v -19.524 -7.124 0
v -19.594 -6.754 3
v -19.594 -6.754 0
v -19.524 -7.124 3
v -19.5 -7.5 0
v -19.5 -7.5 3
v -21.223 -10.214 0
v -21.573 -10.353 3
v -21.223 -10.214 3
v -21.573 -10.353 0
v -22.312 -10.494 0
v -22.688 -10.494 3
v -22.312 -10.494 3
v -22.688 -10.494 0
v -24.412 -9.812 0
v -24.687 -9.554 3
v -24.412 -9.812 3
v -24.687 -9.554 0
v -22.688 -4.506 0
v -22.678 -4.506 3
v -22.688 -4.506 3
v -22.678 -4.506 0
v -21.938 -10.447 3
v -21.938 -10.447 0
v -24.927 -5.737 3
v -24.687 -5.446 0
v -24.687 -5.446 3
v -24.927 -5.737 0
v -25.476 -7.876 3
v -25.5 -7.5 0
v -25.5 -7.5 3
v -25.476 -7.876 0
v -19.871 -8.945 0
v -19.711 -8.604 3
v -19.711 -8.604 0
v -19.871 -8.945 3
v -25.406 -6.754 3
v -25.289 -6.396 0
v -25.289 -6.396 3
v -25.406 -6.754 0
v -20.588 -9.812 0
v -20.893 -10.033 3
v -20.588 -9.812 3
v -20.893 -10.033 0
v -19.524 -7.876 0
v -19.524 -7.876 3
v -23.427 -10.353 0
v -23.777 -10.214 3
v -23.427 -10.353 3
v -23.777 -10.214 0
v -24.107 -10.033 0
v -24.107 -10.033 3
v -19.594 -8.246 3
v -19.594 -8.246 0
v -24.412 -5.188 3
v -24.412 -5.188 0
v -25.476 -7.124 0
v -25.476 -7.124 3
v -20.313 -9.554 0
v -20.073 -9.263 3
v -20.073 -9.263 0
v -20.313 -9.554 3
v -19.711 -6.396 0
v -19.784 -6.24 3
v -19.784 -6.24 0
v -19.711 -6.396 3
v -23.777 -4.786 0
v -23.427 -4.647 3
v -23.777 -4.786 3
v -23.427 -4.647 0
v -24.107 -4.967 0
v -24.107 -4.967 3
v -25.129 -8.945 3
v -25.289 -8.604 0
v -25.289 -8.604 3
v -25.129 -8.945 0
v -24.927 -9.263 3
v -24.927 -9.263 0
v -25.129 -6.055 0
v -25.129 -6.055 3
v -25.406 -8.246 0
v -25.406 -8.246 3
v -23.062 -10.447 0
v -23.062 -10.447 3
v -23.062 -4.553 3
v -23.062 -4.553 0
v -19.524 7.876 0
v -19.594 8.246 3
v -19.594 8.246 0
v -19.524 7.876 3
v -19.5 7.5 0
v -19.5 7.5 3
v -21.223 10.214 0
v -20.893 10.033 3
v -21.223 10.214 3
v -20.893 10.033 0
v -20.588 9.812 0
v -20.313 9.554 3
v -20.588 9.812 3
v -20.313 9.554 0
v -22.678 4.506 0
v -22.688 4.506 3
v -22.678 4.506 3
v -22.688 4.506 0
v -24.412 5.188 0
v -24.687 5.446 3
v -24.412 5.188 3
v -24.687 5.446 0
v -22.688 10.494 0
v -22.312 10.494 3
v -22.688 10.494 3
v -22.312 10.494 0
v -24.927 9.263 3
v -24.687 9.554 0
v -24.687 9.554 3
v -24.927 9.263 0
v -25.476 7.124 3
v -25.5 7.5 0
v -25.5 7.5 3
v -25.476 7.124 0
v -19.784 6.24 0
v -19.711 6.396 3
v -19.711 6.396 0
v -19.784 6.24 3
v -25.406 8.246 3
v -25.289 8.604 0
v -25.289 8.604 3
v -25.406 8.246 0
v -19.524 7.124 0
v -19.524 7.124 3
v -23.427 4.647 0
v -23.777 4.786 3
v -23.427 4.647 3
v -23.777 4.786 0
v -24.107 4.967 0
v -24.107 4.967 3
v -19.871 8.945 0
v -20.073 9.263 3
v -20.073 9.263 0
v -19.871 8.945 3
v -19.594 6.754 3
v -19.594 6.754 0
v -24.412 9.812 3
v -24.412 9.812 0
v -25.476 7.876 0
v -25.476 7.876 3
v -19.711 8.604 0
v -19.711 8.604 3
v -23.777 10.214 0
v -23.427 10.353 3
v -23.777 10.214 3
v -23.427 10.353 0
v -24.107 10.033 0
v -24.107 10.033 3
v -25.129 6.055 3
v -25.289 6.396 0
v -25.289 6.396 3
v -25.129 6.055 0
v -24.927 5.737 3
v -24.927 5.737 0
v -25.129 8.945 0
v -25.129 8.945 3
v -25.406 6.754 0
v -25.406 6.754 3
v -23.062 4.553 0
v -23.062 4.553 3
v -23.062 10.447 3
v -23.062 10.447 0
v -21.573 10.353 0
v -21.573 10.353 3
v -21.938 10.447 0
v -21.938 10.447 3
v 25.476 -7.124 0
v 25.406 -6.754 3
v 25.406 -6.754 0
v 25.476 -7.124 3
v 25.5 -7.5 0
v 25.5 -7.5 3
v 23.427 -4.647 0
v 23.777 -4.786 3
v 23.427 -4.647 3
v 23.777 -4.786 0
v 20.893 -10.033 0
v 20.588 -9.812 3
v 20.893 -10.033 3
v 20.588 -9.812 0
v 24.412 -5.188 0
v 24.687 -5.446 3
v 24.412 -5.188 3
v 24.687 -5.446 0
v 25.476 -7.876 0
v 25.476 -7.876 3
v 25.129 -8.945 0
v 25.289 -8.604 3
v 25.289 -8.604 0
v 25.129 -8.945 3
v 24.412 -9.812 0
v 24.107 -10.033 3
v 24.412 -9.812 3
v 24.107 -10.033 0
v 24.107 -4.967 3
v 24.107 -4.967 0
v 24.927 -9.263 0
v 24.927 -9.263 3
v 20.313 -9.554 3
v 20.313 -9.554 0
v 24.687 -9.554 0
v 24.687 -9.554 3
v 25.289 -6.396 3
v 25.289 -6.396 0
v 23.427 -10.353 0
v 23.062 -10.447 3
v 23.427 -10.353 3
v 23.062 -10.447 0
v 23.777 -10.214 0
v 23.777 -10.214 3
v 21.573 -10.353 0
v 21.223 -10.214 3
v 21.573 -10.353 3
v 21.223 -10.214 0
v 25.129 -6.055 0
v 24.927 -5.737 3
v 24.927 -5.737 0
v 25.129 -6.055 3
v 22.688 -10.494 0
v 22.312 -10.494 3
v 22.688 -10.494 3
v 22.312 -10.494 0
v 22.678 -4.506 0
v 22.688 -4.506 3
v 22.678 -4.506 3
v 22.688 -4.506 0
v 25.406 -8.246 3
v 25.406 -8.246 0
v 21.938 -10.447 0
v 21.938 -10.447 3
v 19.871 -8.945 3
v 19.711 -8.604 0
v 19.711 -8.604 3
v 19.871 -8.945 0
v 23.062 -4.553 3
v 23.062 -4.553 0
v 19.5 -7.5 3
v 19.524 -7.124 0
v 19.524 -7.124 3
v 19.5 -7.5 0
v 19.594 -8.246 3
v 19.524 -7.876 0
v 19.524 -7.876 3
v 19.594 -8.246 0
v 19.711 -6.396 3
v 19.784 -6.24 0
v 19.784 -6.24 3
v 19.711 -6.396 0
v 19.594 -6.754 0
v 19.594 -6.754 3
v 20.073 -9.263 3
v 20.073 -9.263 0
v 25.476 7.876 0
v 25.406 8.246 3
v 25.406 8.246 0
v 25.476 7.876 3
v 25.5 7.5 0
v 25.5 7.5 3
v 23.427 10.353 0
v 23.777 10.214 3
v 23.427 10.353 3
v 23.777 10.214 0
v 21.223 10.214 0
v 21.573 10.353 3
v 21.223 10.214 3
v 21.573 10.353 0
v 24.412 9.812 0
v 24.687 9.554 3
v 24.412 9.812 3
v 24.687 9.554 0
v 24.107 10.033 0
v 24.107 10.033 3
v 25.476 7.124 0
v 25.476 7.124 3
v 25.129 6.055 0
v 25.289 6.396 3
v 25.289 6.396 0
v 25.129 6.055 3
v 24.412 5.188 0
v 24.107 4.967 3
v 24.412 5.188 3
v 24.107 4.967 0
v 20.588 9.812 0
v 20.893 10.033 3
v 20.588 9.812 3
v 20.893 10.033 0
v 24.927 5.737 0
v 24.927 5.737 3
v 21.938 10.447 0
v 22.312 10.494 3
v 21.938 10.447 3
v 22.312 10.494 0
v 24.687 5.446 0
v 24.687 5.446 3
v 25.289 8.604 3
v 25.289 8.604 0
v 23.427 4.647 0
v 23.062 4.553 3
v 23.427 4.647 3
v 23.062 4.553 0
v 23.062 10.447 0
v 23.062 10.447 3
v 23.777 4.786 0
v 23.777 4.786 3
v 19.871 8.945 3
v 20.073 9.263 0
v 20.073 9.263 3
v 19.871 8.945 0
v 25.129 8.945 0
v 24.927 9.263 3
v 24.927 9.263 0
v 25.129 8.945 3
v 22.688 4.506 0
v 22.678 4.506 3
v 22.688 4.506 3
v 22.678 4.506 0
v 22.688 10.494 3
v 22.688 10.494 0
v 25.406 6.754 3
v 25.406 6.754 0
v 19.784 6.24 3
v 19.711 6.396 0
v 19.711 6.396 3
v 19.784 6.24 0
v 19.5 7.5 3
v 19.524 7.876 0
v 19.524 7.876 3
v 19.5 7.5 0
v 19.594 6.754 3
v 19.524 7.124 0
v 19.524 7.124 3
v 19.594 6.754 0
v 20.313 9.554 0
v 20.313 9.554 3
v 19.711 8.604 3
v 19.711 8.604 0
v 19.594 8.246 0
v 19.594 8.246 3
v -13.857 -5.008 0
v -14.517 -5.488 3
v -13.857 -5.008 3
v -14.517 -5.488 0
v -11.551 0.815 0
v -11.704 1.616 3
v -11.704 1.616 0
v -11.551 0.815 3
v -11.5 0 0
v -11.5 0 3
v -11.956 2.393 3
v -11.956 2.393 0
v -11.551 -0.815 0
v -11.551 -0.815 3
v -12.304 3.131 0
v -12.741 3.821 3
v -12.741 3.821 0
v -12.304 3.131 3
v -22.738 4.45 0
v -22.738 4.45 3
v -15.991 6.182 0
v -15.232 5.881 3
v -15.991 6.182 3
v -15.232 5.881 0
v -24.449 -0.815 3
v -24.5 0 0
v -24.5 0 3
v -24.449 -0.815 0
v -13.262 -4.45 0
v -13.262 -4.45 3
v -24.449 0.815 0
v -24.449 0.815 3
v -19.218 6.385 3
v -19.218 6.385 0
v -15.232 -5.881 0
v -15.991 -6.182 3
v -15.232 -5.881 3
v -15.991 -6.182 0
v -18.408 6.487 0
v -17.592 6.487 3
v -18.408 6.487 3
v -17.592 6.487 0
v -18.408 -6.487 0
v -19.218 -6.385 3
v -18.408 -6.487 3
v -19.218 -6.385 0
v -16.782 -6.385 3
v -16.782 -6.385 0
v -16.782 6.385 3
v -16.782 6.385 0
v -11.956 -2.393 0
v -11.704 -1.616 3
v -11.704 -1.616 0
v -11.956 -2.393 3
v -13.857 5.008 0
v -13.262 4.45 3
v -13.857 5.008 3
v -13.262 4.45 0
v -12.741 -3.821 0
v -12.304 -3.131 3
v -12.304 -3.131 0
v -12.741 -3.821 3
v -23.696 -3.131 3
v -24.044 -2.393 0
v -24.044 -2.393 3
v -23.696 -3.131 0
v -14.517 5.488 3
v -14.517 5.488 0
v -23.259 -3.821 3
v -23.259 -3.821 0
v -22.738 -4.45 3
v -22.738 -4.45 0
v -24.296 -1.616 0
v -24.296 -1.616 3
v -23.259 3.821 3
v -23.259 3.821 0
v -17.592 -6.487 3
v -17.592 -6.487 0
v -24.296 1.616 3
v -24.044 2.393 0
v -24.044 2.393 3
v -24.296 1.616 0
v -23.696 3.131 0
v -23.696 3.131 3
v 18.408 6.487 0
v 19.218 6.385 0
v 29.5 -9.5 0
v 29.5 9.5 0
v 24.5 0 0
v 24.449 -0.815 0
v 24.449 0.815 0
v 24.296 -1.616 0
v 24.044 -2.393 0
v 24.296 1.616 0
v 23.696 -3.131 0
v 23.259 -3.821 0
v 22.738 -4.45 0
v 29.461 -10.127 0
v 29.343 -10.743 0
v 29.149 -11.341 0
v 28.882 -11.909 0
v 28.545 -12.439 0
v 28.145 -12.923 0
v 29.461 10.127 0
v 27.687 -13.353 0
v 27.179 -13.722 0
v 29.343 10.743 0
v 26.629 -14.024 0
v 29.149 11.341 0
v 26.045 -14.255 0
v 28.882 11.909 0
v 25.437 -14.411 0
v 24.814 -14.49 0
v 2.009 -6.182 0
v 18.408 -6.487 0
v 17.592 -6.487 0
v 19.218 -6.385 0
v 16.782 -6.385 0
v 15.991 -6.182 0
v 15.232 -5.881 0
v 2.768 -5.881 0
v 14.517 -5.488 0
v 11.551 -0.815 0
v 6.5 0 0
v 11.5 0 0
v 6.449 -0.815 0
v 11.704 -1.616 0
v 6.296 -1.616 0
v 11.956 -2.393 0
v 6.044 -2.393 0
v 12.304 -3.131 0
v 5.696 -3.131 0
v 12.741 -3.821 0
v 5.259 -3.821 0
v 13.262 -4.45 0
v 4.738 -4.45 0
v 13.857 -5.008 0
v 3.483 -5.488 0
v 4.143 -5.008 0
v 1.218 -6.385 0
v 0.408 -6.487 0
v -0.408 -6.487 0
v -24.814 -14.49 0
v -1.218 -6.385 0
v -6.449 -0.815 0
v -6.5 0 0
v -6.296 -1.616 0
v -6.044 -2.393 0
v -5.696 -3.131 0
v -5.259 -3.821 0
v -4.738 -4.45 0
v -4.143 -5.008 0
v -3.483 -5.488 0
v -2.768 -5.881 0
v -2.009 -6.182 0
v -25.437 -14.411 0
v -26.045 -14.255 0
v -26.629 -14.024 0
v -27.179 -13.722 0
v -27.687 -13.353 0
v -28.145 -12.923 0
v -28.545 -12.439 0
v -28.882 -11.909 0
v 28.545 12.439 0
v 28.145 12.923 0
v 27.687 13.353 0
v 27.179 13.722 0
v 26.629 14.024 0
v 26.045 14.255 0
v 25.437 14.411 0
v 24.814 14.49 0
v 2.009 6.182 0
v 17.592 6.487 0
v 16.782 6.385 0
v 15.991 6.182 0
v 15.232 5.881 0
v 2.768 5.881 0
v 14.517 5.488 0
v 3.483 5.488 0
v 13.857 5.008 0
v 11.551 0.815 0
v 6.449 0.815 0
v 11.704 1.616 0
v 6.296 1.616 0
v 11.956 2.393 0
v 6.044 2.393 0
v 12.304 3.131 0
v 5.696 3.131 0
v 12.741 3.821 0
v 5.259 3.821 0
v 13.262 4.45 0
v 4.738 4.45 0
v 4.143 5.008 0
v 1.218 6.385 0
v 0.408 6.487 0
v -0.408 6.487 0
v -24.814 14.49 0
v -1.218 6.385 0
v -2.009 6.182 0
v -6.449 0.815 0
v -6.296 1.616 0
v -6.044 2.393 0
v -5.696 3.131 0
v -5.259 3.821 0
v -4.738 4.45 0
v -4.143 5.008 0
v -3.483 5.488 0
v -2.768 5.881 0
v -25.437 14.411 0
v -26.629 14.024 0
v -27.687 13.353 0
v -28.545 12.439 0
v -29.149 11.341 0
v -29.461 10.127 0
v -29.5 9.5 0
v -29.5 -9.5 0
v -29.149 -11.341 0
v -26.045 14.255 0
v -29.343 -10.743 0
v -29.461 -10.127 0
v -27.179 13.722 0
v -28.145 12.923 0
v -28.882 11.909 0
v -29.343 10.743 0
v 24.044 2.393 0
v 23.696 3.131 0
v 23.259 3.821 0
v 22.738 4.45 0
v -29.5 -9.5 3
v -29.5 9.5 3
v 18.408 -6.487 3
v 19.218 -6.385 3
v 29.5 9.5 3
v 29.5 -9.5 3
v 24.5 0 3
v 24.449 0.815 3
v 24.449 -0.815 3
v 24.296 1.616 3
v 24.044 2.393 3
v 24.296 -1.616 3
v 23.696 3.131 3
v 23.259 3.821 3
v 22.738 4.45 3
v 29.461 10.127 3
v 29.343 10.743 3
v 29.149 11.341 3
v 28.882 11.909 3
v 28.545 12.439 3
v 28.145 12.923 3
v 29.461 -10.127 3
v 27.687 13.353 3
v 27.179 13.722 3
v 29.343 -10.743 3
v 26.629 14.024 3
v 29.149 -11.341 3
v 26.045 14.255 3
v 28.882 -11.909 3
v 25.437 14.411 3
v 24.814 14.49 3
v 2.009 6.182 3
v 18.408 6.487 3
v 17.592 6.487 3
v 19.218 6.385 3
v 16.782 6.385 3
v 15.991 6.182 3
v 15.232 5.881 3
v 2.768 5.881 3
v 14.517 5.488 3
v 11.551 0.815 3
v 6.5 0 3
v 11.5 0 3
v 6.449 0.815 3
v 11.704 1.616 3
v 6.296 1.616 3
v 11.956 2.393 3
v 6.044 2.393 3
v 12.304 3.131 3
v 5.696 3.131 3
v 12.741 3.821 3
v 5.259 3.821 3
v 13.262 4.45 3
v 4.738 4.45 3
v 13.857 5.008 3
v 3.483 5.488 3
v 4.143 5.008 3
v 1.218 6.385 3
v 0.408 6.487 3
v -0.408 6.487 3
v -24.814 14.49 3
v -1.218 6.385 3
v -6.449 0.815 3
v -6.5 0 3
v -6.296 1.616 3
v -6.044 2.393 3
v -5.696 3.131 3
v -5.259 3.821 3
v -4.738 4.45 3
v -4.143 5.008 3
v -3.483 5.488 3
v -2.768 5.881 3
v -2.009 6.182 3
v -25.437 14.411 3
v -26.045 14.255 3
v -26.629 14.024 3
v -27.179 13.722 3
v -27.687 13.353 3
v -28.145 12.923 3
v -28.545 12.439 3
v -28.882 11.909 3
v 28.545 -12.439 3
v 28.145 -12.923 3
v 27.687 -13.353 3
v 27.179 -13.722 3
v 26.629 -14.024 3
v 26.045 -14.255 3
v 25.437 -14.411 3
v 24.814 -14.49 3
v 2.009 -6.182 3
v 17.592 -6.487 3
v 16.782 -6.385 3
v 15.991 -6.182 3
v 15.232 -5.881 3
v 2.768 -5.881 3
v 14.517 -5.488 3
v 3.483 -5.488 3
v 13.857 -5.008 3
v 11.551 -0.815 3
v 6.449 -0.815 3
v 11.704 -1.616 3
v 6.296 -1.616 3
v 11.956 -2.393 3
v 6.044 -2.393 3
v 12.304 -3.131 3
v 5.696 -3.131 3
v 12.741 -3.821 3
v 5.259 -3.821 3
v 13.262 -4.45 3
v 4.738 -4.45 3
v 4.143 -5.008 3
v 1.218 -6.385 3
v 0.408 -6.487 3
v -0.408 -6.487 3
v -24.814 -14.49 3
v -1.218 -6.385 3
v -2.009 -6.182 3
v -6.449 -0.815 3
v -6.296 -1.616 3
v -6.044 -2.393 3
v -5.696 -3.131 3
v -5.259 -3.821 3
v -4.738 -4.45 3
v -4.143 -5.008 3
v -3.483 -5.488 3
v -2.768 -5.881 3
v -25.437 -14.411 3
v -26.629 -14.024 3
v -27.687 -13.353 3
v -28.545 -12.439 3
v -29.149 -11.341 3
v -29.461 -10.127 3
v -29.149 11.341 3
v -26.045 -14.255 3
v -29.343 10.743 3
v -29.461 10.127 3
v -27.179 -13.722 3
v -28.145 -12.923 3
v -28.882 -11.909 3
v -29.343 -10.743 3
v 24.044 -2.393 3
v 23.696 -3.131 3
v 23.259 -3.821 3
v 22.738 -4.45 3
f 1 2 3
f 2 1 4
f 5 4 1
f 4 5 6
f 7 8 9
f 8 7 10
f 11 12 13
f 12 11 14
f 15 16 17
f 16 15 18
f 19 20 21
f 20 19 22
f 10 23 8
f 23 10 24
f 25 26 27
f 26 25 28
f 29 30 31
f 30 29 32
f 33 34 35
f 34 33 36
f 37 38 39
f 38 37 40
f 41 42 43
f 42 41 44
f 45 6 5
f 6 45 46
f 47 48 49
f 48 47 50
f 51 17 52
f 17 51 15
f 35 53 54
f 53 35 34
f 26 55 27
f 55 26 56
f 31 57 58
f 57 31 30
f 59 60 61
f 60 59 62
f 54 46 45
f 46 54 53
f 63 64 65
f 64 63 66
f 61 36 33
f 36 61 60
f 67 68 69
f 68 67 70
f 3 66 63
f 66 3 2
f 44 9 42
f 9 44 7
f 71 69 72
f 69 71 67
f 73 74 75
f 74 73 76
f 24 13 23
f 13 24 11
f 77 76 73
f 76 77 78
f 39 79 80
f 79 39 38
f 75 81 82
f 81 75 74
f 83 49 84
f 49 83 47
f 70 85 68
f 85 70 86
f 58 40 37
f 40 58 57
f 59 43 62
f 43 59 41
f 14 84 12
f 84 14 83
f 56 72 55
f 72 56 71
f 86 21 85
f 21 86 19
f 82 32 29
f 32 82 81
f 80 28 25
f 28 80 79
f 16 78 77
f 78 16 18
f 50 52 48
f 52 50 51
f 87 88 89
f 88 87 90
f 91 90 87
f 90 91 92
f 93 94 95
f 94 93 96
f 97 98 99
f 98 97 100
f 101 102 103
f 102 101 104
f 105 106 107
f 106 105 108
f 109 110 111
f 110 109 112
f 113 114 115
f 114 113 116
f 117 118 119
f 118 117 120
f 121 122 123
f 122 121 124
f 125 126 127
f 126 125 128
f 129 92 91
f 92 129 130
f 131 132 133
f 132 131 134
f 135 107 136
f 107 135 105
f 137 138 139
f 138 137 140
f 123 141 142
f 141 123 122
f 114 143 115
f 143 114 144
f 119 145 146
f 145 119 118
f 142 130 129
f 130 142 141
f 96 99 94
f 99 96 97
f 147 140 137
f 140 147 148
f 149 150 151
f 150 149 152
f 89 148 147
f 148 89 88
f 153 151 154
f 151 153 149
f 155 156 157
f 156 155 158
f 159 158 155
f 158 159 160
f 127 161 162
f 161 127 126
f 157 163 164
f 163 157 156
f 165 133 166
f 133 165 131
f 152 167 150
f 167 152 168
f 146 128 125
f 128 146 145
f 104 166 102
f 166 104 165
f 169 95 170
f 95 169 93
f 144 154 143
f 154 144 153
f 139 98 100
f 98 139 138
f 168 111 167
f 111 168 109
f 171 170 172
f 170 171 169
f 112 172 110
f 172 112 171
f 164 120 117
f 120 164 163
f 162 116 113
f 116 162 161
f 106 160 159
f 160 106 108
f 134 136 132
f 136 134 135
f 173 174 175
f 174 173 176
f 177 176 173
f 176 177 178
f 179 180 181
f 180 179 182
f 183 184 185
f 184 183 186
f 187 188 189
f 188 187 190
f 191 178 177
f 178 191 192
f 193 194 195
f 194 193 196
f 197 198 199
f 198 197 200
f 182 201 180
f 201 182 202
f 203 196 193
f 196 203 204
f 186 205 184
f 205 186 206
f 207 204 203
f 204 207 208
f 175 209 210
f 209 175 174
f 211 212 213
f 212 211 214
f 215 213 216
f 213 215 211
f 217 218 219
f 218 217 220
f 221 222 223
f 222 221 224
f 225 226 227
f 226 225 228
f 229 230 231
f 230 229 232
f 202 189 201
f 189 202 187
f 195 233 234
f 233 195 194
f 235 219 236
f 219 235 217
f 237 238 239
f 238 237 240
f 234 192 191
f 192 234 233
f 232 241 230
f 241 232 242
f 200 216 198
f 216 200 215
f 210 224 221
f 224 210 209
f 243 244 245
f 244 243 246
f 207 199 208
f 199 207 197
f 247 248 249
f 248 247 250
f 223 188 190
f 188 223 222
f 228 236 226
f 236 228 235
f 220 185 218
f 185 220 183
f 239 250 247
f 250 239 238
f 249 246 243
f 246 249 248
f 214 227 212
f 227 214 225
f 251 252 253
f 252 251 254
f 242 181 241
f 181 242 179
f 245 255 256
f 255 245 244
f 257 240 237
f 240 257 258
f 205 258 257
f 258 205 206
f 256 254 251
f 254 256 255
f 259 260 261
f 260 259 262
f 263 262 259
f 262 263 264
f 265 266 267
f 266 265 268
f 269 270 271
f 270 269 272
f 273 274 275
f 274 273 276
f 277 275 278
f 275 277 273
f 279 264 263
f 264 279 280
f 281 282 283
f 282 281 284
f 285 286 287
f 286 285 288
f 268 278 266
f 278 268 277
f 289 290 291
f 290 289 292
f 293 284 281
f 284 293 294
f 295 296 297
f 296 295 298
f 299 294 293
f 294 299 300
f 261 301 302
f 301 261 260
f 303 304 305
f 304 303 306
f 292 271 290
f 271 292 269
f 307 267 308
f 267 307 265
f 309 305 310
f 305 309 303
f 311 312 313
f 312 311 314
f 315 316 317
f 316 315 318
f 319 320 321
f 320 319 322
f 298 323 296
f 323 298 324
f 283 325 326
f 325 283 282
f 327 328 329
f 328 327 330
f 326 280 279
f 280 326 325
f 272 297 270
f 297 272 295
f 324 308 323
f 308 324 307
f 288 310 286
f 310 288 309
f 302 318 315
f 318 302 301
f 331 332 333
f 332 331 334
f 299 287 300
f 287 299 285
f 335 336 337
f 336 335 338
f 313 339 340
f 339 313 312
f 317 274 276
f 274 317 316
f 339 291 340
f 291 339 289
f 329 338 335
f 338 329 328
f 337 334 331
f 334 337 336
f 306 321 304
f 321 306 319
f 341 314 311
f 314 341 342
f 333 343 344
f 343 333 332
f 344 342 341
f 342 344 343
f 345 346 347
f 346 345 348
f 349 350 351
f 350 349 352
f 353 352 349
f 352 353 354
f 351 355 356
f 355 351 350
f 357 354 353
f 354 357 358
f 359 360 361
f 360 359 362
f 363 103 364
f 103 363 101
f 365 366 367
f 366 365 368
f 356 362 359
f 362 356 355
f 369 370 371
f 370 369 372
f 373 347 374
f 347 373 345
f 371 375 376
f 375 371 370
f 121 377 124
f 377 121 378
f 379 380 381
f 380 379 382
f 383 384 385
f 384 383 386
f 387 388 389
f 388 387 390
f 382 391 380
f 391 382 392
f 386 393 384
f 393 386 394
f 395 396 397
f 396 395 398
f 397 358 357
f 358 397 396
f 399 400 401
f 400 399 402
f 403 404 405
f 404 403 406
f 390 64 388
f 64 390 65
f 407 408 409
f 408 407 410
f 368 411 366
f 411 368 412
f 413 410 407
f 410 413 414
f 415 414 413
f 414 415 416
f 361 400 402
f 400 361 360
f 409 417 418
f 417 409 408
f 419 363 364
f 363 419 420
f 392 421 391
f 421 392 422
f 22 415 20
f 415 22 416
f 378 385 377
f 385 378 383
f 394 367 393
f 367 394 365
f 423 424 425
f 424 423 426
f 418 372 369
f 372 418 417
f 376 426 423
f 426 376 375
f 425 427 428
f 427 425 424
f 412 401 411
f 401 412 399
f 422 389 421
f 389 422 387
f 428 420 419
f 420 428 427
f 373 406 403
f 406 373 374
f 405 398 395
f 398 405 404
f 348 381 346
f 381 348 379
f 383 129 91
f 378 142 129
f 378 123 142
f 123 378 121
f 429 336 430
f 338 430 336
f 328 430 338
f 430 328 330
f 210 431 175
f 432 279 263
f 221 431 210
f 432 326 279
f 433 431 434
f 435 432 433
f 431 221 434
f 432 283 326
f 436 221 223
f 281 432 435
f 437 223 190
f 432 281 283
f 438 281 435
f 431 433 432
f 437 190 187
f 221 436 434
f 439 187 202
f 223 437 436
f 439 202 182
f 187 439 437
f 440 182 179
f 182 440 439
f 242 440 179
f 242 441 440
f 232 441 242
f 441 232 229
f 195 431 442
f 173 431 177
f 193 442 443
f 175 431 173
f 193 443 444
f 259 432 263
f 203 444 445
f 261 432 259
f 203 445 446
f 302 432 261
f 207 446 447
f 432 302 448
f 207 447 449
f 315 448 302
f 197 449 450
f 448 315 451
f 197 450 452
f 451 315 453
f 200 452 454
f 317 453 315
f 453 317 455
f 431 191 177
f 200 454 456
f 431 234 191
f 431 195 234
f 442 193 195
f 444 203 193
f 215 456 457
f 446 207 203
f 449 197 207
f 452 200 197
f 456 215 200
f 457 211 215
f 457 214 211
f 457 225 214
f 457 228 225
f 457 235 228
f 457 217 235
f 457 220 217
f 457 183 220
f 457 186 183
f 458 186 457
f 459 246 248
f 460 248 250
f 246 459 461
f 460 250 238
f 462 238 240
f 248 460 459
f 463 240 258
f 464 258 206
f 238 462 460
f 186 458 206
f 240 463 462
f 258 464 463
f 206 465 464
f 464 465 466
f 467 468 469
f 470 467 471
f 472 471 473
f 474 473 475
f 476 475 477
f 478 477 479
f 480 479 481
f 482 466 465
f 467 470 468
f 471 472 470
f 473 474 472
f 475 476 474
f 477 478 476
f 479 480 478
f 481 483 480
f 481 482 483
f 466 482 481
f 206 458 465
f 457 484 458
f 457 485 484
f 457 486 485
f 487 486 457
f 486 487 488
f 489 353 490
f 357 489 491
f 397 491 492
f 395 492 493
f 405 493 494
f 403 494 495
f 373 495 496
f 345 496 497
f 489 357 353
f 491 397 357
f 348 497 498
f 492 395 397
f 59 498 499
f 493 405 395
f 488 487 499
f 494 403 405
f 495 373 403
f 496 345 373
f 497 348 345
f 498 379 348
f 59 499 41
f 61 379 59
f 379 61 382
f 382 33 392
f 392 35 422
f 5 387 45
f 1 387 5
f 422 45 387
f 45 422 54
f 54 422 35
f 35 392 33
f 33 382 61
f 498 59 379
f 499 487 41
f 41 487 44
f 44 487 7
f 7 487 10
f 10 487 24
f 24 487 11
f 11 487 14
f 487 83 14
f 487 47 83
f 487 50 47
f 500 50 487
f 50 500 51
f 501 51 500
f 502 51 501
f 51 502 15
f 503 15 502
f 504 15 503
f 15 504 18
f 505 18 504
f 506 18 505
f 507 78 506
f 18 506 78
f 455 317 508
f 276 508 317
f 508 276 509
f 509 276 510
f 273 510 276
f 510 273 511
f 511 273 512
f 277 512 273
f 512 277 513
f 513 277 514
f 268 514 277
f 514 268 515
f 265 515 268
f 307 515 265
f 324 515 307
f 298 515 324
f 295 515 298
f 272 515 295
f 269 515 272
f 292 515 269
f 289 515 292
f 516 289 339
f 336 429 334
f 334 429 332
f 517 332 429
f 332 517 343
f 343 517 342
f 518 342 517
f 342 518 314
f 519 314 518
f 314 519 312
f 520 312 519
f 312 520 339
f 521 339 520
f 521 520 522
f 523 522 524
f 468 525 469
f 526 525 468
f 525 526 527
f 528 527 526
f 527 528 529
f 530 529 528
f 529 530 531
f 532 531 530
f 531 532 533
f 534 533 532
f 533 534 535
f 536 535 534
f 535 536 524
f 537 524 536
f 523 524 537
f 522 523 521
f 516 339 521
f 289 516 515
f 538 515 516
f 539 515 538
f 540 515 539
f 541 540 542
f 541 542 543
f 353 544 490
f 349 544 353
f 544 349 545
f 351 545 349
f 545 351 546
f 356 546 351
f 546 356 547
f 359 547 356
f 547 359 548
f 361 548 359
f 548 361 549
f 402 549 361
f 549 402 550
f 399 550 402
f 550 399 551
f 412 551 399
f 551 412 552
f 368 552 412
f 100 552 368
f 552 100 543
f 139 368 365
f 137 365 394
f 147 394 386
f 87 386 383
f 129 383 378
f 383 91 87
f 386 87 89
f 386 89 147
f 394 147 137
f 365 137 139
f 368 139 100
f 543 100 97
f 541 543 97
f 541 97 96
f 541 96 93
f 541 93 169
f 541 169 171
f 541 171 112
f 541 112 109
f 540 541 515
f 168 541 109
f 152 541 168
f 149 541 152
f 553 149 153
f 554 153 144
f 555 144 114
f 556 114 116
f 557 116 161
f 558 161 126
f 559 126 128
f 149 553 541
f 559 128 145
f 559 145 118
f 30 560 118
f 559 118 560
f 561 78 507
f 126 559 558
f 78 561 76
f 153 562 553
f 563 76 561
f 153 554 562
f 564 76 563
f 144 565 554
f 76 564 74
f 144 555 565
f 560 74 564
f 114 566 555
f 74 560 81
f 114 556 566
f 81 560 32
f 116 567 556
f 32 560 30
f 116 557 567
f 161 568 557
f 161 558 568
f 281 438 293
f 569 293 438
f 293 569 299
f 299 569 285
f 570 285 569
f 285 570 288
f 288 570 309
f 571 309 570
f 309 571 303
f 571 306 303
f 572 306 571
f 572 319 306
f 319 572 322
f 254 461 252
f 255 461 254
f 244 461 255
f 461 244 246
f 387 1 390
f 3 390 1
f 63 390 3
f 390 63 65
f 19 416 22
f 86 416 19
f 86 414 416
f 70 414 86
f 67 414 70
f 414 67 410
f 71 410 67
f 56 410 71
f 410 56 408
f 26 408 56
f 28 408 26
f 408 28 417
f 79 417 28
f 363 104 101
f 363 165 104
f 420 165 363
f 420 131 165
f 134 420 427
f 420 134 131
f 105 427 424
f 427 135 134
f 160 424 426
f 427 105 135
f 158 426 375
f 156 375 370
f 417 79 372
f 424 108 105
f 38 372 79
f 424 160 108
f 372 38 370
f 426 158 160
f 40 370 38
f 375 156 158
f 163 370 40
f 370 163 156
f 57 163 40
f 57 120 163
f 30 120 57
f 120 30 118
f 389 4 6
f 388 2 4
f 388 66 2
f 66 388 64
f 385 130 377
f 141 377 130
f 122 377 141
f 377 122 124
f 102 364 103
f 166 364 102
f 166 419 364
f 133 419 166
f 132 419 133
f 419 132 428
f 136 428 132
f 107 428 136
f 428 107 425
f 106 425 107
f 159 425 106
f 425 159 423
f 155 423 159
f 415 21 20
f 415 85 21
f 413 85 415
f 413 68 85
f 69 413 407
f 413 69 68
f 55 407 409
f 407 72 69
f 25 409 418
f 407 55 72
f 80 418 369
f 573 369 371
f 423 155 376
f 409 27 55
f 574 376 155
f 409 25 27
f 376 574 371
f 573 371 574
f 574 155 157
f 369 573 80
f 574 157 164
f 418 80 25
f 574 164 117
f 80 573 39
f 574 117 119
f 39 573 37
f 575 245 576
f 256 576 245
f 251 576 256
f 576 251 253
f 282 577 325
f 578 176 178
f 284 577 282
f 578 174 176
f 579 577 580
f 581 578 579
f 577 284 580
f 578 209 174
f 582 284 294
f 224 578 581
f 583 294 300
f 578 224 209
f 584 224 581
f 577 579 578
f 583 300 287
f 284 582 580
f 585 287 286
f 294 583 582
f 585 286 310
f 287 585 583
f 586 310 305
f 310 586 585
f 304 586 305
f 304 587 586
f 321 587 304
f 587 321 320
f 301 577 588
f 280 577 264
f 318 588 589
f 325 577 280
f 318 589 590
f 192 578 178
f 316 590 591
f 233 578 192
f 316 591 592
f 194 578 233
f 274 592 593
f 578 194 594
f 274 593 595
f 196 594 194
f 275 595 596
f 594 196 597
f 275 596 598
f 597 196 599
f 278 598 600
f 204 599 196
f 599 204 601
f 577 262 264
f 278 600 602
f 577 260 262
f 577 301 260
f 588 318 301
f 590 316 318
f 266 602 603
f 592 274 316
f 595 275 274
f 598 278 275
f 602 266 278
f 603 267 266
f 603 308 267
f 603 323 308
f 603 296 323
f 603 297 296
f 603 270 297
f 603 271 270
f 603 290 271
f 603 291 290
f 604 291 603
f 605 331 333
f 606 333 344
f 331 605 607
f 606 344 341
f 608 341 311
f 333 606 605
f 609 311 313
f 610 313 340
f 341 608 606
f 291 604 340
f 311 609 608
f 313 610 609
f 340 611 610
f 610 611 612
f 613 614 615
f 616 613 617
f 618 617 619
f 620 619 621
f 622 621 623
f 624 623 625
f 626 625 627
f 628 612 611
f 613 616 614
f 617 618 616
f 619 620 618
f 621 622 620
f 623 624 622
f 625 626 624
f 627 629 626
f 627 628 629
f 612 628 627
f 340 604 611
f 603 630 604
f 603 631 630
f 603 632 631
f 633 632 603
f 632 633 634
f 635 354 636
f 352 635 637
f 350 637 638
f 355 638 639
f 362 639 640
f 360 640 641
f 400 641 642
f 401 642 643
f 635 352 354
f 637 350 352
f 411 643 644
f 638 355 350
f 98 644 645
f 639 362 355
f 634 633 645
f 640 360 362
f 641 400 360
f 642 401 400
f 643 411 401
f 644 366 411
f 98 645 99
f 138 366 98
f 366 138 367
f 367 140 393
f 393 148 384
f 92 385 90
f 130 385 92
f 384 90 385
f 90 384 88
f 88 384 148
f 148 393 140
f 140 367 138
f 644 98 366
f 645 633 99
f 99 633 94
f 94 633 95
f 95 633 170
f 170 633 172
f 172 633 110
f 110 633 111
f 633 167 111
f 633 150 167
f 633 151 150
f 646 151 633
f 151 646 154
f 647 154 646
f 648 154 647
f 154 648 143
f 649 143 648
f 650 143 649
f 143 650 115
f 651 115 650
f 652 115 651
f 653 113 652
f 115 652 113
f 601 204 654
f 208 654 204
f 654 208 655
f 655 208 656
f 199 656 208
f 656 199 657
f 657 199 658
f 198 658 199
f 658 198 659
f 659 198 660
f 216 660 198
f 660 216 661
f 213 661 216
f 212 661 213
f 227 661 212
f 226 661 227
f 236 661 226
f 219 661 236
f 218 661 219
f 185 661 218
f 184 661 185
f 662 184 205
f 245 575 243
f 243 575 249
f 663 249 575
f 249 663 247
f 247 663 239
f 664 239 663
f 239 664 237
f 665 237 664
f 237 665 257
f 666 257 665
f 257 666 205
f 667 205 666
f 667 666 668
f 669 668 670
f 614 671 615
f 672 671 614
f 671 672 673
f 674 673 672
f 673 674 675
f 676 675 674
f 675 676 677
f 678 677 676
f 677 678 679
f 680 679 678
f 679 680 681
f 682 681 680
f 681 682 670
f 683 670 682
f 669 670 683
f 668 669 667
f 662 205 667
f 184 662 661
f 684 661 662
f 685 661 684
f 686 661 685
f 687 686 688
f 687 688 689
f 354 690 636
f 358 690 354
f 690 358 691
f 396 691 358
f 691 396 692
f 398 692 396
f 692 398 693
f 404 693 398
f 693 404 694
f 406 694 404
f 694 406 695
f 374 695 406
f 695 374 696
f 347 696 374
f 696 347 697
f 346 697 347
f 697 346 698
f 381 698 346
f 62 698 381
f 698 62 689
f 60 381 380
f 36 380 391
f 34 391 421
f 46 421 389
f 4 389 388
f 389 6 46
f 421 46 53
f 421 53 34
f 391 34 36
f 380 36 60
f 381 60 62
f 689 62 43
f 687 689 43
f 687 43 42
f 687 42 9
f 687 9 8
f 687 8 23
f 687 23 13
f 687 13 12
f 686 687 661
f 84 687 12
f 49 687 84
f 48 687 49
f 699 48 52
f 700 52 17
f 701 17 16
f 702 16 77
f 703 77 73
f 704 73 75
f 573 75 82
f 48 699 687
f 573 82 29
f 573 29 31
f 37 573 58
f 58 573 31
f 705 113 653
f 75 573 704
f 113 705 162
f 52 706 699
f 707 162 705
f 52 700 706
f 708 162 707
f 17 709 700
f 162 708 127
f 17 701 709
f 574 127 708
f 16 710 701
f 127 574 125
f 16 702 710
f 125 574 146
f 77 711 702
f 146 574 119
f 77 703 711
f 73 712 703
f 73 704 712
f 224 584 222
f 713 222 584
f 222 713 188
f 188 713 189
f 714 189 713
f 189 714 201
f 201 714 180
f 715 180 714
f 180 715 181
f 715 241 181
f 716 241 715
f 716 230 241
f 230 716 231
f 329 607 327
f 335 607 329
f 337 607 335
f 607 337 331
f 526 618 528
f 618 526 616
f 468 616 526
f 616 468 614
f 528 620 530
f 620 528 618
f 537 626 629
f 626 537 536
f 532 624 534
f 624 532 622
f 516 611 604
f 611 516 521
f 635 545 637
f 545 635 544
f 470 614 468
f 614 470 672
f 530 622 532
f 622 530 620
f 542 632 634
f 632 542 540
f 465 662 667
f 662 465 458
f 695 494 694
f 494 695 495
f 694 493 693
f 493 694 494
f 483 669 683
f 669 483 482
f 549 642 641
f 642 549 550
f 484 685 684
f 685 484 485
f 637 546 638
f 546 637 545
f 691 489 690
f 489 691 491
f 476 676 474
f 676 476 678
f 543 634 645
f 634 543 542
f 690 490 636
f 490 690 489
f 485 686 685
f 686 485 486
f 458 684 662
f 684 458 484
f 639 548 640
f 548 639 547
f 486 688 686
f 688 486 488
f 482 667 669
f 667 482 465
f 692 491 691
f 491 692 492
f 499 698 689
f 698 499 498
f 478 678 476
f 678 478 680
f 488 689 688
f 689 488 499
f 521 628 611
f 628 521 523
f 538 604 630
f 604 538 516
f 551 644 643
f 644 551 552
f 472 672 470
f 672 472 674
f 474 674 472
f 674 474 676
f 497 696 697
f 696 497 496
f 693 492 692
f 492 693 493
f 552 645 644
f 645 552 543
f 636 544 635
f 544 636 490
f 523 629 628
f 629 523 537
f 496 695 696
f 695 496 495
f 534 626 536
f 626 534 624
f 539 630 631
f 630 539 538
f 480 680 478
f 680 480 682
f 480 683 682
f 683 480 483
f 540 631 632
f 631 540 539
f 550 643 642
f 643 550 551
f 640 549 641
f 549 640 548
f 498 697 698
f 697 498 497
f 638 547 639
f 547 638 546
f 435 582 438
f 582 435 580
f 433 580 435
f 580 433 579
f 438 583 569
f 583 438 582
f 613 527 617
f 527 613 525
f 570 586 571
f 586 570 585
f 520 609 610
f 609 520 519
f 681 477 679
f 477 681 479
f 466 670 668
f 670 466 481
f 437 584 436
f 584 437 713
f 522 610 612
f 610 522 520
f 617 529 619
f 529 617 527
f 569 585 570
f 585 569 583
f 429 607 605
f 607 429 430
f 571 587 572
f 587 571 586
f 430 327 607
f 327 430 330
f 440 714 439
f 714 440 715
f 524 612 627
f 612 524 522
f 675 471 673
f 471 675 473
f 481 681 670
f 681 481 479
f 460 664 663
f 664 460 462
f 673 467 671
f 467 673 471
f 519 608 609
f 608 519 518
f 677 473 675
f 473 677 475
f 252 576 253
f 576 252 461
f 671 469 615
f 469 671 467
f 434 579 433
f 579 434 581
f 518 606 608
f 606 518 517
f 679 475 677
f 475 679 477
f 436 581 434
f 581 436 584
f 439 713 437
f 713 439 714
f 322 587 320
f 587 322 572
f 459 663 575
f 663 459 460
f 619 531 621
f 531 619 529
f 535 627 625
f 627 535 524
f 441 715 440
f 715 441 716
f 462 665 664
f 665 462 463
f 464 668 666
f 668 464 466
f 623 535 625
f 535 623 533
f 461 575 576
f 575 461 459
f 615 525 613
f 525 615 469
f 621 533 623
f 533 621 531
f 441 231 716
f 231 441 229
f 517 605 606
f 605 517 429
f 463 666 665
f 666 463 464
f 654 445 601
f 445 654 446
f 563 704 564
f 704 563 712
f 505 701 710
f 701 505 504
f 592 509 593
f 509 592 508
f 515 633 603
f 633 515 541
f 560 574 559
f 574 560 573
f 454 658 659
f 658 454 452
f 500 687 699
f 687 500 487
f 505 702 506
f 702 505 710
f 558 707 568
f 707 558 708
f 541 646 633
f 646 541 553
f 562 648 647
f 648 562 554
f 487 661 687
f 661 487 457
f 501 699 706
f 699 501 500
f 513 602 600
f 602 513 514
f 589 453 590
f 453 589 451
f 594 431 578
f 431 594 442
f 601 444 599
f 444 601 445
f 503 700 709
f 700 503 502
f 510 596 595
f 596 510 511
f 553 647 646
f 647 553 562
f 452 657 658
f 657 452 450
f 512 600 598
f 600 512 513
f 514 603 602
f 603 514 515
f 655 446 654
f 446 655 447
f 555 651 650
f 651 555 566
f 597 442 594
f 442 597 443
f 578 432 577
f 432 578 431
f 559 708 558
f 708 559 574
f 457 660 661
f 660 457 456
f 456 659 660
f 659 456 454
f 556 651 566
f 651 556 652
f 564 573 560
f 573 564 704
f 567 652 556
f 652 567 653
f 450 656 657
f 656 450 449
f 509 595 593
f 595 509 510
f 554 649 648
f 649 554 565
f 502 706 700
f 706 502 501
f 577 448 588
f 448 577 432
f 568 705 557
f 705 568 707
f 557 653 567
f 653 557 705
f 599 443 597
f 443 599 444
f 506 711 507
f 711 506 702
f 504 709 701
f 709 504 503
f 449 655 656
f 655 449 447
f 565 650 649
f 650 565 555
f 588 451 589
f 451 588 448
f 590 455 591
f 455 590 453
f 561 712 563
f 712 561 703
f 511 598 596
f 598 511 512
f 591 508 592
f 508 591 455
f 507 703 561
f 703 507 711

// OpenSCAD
$fn = 50;


difference() {
	union() {
		hull() {
			translate(v = [-24.5000000000, 9.5000000000, 0]) {
				cylinder(h = 3, r = 5);
			}
			translate(v = [24.5000000000, 9.5000000000, 0]) {
				cylinder(h = 3, r = 5);
			}
			translate(v = [-24.5000000000, -9.5000000000, 0]) {
				cylinder(h = 3, r = 5);
			}
			translate(v = [24.5000000000, -9.5000000000, 0]) {
				cylinder(h = 3, r = 5);
			}
		}
	}
	union() {
		#translate(v = [-22.5000000000, -7.5000000000, -100.0000000000]) {
			cylinder(h = 200, r = 3.0000000000);
		}
		#translate(v = [-22.5000000000, 7.5000000000, -100.0000000000]) {
			cylinder(h = 200, r = 3.0000000000);
		}
		#translate(v = [22.5000000000, -7.5000000000, -100.0000000000]) {
			cylinder(h = 200, r = 3.0000000000);
		}
		#translate(v = [22.5000000000, 7.5000000000, -100.0000000000]) {
			cylinder(h = 200, r = 3.0000000000);
		}
		#translate(v = [-18.0000000000, 0, 0]) {
			cylinder(h = 3, r = 6.5000000000);
		}
		#cylinder(h = 3, r = 6.5000000000);
		#translate(v = [18.0000000000, 0, 0]) {
			cylinder(h = 3, r = 6.5000000000);
		}
	}
}
